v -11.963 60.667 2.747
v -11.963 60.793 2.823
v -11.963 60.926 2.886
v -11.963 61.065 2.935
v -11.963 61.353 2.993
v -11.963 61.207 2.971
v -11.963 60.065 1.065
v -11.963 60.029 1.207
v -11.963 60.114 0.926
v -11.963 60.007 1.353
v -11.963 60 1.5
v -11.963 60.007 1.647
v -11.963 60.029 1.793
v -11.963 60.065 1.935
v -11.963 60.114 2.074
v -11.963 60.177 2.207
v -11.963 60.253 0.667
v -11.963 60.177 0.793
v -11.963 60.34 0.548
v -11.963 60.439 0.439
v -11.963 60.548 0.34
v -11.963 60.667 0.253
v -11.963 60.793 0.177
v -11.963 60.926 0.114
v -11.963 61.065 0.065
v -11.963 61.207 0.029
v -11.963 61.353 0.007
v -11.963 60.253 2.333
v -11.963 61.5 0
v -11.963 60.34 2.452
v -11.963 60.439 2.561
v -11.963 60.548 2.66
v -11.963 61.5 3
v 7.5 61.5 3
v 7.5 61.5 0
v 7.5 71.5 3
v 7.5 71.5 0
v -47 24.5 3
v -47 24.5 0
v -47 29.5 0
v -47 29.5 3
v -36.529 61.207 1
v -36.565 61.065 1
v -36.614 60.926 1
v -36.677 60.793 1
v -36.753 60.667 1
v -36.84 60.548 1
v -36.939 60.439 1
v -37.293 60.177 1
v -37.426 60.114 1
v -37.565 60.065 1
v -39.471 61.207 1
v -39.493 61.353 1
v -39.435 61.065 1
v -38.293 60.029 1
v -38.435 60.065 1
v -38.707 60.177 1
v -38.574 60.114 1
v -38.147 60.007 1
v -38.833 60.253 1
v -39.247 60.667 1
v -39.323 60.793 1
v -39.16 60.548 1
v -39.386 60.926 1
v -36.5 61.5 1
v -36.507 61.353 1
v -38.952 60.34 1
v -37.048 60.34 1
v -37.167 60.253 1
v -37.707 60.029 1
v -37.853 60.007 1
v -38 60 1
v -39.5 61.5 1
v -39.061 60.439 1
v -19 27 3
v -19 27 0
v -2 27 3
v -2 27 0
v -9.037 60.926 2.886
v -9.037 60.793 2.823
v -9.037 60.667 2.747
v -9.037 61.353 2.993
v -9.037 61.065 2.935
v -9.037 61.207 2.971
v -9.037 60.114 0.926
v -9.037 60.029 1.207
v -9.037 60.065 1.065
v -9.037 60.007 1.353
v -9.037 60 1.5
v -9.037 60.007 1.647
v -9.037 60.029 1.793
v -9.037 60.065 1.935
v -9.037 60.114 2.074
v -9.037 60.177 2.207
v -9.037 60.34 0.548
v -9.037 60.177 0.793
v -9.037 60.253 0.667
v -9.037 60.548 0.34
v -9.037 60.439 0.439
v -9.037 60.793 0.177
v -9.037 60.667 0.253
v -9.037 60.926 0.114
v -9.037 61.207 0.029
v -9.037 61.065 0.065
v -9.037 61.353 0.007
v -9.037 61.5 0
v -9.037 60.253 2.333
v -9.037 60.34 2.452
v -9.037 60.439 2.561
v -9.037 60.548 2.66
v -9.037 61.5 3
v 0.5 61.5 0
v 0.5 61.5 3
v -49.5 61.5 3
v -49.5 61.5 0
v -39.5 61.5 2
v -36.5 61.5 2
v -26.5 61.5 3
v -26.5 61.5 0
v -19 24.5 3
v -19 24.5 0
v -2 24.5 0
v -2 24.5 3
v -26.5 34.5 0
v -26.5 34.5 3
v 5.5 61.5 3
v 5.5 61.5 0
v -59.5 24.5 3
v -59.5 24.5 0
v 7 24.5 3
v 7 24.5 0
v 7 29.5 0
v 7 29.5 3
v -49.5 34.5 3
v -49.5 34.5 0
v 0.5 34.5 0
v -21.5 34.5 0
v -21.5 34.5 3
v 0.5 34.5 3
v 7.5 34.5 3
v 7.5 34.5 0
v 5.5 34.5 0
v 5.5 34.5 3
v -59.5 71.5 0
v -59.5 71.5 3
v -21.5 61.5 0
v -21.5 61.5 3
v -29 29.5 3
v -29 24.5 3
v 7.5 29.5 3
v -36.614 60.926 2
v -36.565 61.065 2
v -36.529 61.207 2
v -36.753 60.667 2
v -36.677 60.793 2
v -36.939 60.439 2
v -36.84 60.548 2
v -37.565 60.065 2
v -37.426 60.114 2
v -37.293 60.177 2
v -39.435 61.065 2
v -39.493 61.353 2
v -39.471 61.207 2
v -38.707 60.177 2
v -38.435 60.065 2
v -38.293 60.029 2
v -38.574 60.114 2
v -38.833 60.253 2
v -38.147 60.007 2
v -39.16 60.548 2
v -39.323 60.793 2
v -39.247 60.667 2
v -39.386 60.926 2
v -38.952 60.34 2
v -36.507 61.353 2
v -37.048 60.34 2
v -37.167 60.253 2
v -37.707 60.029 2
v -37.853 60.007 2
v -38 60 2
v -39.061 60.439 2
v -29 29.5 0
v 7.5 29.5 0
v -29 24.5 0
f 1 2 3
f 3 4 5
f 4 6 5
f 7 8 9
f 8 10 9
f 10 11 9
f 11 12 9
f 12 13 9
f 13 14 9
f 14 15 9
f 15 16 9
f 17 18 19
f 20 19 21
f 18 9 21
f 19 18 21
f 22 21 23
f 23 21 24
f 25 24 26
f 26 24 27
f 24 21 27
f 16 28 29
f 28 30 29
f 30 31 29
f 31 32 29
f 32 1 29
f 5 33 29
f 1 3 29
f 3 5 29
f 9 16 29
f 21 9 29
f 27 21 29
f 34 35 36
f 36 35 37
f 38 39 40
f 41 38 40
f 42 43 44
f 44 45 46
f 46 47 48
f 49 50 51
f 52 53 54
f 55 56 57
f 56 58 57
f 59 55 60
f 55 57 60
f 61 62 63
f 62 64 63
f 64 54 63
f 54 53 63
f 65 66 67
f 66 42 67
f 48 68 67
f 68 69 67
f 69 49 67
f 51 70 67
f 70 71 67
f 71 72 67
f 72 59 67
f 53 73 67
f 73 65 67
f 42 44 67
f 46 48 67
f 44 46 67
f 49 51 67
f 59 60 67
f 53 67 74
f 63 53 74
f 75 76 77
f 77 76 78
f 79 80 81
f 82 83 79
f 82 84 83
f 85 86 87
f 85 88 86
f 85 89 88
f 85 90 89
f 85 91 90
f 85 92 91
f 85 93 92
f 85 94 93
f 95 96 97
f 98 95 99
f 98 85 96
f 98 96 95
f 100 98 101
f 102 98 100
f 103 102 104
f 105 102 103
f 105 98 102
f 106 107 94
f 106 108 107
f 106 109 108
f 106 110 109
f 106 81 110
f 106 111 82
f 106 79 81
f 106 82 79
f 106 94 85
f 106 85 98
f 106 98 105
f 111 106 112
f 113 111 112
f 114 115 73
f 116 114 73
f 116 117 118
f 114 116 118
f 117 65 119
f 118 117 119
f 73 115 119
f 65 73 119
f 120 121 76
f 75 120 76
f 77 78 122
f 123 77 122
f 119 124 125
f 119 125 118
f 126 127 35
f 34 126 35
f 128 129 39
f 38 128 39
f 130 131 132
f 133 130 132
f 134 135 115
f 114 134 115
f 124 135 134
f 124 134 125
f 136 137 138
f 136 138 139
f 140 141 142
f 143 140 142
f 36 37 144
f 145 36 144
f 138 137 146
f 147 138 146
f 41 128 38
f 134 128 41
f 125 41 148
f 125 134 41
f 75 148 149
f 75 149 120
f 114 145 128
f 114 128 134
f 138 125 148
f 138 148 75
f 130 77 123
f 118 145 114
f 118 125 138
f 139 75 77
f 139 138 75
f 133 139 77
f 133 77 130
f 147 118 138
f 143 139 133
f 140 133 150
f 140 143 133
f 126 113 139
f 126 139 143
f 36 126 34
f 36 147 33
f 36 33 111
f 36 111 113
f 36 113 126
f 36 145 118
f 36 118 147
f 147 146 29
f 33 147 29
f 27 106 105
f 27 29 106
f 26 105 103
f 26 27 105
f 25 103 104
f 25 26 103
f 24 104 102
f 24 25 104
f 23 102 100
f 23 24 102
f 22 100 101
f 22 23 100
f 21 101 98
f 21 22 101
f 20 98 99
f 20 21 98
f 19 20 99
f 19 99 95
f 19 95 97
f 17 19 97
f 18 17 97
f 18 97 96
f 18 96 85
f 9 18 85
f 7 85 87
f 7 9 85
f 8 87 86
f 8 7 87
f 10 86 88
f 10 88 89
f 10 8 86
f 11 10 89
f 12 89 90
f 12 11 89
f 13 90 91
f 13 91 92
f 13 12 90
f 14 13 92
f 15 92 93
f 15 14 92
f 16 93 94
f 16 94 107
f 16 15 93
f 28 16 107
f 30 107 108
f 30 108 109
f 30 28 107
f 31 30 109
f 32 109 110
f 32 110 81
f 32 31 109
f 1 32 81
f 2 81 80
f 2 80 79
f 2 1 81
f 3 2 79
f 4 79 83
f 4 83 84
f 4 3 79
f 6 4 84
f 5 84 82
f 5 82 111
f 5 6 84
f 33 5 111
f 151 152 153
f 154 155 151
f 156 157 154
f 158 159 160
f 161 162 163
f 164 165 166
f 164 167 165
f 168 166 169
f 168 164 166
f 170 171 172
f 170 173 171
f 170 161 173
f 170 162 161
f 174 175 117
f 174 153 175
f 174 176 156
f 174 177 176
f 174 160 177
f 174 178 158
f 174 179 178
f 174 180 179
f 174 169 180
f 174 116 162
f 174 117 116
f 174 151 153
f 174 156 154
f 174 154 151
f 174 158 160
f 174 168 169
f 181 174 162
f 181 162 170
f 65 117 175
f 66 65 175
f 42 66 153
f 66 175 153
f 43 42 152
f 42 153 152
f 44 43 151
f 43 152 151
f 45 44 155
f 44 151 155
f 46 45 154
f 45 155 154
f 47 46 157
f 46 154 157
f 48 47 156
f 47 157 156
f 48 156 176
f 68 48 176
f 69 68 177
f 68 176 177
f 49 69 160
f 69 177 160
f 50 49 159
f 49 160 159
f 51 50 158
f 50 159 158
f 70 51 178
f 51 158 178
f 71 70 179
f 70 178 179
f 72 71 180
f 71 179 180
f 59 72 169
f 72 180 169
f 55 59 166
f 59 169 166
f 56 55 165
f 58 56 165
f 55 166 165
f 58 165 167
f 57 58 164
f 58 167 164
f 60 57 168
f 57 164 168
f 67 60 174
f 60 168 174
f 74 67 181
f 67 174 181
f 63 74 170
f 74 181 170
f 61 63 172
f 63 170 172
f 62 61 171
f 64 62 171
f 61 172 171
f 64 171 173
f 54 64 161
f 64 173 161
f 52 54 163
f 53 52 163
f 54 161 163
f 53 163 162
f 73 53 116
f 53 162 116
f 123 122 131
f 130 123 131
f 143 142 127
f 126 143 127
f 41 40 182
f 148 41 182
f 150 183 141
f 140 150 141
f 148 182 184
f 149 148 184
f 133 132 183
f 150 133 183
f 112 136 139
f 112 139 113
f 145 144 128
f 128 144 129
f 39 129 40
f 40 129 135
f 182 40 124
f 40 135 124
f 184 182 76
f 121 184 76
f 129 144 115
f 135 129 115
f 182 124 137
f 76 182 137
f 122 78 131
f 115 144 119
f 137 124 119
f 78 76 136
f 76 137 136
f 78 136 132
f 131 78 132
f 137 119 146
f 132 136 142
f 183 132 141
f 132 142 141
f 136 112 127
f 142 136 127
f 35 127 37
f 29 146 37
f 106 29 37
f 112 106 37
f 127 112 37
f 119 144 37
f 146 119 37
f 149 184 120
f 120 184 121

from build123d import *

# Parameters (mm, degrees)
F0_W     = 23
F0_H     = 27
F0_W_2   = 22
F1_DEPTH = 3
F2_W     = 1.5
F2_H     = 1
F4_W     = 1.463154
F4_H     = 1.5


with BuildPart() as f1:
    # F0 (on Top) → F1 (new body)
    with BuildSketch(Plane.XY):
        Polygon((-59.5, 71.5), (-59.5, 24.5), (-47, 24.5), (-47, 29.5), (-29, 29.5), (-29, 24.5), (-19, 24.5), (-19, 27), (-2, 27), (-2, 24.5), (7, 24.5), (7, 29.5), (7.5, 29.5), (7.5, 34.5), (5.5, 34.5), (5.5, 61.5), (7.5, 61.5), (7.5, 71.5), align=None)
        with Locations((-38, 48)):
            Rectangle(F0_W, F0_H, mode=Mode.SUBTRACT)
        with Locations((-10.5, 48)):
            Rectangle(F0_W_2, F0_H, mode=Mode.SUBTRACT)
    extrude(amount=F1_DEPTH)

    # F2 (on face) → F3 (revolve)
    with BuildSketch(Plane.XZ.offset(-61.5)):
        with Locations((-37.25, 1.5)):
            Rectangle(F2_W, F2_H)
    revolve(axis=Axis((-38, 61.5, 1.5), (0, 0, -1)))

    # F4 (on face) → F5 (revolve)
    with BuildSketch(Plane.XZ.offset(-61.5)):
        with Locations((-11.231577, 2.25)):
            Rectangle(F4_W, F4_H)
        with Locations((-9.768423, 2.25)):
            Rectangle(F4_W, F4_H)
    revolve(axis=Axis((-10.5, 61.5, 1.5), (-1, 0, 0)))


solid = f1.part
